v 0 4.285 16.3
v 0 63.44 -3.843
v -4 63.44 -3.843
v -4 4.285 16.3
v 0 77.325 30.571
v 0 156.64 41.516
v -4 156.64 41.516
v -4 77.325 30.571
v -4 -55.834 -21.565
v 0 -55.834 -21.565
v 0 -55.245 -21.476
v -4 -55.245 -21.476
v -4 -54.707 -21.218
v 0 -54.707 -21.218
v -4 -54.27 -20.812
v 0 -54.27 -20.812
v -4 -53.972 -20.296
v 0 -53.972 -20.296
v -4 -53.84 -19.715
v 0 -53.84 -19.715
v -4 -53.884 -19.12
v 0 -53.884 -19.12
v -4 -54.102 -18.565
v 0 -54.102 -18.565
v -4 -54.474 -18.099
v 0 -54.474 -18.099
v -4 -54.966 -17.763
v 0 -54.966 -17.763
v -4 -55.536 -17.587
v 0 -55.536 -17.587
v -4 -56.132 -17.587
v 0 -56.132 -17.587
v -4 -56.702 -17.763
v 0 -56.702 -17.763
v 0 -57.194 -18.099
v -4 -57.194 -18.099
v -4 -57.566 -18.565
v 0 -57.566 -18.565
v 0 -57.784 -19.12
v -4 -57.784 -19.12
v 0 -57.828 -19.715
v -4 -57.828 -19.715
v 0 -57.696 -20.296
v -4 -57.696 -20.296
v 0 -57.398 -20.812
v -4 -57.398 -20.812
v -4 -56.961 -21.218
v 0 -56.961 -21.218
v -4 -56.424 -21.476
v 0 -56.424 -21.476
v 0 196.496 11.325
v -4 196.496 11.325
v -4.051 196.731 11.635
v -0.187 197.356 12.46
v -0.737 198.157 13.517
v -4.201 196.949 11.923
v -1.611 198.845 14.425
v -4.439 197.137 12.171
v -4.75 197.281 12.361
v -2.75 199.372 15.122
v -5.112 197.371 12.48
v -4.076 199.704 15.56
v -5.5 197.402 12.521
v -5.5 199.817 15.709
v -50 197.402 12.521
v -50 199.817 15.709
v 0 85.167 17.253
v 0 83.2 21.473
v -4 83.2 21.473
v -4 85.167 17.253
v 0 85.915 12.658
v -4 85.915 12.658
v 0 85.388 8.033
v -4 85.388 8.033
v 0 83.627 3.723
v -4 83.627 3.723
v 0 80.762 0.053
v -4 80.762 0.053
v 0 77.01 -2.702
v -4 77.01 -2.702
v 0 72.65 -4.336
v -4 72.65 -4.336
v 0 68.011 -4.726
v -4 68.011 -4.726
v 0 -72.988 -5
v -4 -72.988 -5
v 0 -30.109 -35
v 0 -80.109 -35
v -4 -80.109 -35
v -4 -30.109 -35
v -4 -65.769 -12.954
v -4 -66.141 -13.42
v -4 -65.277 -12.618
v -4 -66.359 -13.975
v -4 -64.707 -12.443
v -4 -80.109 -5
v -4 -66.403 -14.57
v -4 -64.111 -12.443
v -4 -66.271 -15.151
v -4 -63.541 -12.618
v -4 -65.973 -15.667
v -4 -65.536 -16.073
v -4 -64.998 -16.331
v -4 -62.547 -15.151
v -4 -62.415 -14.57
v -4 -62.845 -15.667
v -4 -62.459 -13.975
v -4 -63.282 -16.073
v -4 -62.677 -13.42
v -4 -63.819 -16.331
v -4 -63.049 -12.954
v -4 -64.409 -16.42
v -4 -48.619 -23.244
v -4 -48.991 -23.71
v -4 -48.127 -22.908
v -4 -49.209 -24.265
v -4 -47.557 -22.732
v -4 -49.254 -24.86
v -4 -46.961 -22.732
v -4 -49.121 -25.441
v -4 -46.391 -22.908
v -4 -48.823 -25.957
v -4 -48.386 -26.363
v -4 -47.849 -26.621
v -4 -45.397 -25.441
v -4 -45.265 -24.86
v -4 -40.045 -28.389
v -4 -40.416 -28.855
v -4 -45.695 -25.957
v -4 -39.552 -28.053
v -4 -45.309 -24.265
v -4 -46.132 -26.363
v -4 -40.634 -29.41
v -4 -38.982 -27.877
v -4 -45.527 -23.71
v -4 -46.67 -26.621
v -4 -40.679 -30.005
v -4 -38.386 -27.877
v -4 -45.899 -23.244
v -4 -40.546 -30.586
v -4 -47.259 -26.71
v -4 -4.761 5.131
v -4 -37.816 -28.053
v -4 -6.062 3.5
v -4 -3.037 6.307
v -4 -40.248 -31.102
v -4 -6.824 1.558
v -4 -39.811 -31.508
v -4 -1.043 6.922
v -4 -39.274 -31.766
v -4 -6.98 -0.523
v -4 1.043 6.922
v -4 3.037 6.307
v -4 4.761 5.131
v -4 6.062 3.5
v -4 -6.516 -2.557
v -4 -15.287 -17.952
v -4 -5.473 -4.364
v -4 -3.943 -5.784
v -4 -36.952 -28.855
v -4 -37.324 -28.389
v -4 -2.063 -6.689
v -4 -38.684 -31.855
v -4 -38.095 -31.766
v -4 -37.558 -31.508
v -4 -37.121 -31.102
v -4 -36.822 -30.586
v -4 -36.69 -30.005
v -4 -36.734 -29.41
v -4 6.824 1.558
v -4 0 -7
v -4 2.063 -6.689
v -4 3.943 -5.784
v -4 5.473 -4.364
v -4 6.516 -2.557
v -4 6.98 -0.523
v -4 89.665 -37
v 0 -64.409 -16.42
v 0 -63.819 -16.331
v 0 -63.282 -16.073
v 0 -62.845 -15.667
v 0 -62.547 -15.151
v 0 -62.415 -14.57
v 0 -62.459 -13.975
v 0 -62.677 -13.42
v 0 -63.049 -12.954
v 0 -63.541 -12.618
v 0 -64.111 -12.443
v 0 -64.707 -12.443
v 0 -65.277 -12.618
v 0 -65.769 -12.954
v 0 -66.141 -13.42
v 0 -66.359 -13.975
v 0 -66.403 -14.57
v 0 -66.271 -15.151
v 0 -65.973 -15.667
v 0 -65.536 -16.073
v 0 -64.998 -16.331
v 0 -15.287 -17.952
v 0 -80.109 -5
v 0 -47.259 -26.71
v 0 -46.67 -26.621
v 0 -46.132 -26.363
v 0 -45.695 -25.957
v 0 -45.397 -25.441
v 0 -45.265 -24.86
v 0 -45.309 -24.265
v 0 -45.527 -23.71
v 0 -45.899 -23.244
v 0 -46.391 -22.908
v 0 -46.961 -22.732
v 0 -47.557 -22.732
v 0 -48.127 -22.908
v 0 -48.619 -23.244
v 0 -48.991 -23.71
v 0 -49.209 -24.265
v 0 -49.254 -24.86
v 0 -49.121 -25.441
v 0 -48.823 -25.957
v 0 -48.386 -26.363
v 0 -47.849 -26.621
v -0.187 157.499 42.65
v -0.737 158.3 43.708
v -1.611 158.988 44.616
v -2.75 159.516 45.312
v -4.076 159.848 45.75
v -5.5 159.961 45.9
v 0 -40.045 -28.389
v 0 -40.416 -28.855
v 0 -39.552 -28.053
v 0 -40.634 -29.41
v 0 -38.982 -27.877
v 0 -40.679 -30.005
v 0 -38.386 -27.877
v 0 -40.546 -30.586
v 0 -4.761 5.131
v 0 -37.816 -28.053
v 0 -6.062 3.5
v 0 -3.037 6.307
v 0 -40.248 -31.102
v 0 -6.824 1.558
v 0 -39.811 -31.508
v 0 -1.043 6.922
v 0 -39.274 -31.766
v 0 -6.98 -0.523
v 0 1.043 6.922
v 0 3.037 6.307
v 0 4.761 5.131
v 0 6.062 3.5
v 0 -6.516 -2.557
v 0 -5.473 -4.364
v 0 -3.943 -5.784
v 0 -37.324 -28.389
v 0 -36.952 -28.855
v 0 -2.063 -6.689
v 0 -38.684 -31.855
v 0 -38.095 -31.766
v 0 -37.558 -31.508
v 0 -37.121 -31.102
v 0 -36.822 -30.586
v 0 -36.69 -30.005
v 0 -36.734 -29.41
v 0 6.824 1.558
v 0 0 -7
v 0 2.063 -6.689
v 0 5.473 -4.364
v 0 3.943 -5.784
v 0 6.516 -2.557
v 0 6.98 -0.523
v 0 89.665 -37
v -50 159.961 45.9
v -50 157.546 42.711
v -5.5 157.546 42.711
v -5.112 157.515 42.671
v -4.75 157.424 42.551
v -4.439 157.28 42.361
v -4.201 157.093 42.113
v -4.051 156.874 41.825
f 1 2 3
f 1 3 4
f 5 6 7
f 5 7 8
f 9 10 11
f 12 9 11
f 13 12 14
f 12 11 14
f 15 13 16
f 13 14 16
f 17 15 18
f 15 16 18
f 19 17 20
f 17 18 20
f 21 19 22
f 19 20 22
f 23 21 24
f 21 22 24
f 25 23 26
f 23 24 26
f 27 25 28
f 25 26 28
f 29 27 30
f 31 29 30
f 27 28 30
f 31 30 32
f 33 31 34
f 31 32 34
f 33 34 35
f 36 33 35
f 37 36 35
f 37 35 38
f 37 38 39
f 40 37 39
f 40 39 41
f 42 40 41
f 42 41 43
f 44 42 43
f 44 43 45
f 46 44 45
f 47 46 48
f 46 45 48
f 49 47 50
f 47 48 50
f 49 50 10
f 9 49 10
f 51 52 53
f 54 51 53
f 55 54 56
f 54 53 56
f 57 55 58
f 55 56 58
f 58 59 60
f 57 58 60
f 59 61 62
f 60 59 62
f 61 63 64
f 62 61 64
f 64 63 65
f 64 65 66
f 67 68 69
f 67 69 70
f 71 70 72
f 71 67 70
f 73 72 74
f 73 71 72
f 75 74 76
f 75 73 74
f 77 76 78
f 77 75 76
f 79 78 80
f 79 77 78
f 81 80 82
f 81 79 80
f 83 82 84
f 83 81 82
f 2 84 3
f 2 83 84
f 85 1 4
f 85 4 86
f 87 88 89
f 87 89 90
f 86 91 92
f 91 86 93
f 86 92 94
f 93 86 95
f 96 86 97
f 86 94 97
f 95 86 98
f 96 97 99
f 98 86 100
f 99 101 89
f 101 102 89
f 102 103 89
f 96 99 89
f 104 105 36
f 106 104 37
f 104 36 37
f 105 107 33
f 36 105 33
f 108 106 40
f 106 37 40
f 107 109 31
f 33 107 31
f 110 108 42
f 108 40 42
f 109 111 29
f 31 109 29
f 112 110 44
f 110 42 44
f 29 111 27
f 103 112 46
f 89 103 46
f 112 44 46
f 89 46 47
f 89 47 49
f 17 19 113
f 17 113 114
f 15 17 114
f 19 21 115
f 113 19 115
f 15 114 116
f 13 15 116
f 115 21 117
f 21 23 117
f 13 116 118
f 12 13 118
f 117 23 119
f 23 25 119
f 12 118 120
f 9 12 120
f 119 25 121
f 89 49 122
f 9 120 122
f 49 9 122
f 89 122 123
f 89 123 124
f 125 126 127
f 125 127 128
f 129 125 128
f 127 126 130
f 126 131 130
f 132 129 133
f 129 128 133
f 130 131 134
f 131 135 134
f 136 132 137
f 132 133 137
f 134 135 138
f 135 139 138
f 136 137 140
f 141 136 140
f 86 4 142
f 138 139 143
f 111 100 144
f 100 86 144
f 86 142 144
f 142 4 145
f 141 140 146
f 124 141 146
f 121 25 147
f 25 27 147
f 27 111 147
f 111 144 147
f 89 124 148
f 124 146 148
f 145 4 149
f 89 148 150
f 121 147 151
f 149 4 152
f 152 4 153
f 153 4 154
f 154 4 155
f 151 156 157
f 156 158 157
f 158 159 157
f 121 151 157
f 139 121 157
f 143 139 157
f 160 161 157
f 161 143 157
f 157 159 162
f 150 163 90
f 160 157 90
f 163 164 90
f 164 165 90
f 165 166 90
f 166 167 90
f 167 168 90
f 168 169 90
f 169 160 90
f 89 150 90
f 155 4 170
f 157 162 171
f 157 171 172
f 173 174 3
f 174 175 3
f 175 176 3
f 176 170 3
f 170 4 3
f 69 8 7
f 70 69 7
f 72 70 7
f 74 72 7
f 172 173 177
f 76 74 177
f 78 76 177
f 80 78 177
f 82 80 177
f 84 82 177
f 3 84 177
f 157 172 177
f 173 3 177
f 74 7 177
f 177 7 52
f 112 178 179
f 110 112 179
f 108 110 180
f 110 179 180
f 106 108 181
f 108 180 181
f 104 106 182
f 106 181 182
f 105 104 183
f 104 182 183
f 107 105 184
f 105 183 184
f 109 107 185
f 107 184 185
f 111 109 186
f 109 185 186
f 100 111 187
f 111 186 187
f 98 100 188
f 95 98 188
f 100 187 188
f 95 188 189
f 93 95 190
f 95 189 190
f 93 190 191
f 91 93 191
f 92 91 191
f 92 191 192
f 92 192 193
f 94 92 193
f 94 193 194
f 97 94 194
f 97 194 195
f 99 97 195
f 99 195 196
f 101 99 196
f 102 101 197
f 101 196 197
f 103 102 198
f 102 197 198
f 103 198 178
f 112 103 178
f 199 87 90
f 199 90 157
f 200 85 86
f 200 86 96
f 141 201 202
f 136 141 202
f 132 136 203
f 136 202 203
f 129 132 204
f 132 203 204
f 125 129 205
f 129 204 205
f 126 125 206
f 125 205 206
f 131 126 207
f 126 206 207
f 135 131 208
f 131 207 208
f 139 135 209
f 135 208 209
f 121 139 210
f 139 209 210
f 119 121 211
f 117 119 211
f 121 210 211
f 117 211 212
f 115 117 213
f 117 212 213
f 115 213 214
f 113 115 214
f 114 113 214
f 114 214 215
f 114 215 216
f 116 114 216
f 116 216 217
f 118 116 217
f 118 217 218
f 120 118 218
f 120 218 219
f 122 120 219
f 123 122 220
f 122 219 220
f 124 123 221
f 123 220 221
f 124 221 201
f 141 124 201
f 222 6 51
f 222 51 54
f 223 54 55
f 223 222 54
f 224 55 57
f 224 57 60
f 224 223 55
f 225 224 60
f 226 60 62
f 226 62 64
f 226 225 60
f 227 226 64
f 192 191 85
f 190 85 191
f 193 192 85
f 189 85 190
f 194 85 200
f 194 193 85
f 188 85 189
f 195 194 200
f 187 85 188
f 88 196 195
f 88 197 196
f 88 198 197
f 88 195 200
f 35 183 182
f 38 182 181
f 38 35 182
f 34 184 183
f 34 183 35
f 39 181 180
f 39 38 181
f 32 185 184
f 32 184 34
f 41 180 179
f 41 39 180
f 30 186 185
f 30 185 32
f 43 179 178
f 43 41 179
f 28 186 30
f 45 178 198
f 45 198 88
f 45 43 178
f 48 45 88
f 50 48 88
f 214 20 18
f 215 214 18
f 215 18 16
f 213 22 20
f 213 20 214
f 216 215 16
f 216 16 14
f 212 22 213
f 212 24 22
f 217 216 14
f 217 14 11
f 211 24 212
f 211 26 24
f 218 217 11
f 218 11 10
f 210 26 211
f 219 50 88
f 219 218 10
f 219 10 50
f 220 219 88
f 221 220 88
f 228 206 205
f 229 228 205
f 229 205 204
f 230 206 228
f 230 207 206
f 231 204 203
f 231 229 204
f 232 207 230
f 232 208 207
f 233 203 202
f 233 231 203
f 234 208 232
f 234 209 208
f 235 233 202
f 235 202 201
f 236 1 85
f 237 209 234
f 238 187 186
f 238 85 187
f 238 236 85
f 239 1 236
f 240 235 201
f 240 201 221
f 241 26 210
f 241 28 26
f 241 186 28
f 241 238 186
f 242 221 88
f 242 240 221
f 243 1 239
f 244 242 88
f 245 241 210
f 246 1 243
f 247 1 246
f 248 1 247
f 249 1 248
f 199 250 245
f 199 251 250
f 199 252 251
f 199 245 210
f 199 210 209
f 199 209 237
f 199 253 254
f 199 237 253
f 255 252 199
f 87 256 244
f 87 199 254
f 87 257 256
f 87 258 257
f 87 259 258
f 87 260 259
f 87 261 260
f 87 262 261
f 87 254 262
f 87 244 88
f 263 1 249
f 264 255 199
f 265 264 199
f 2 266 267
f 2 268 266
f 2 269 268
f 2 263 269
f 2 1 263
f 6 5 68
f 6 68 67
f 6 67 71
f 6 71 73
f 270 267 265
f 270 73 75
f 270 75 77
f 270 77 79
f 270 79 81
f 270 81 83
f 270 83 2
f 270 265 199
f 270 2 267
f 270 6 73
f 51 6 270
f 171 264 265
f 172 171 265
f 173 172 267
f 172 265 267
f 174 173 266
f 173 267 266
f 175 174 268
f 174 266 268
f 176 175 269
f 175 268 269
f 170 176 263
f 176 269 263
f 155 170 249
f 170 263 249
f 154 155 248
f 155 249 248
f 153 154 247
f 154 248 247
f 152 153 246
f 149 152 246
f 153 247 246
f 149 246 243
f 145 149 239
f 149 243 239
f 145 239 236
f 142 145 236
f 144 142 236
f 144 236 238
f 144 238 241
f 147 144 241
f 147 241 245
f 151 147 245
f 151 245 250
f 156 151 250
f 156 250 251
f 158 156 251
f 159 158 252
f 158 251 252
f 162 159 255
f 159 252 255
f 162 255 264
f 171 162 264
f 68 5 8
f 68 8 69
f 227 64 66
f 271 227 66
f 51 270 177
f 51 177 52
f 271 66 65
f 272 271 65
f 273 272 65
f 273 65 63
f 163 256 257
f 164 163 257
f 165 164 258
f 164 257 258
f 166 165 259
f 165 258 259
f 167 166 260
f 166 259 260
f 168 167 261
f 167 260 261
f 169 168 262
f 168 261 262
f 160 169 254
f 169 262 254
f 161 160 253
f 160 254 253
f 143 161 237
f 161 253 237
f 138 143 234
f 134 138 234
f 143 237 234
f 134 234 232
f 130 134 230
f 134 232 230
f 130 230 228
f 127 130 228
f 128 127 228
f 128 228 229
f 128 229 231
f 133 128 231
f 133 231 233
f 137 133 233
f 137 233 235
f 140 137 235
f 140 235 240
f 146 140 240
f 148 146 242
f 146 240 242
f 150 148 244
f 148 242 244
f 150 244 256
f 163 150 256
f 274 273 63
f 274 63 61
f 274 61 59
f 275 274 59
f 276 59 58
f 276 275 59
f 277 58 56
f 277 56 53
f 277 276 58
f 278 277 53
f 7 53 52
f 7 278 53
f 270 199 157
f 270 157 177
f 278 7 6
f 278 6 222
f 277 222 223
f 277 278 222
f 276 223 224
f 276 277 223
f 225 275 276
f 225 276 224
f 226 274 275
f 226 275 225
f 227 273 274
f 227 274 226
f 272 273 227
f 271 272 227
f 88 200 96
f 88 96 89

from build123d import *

# Parameters (mm, degrees)
SKETCH_6_R             = 7
SKETCH_6_R_2           = 2
SM_BASE_FLANGE_2_DEPTH = 4
SM_EDGE_FLANGE_1_DEPTH = 50


# Sheet-metal steps are written as plain solids
with BuildPart() as part:
    # Эскиз6 → Базовая кромка2 (new body)
    with BuildSketch(Plane(origin=(0, 0, 0), x_dir=(0, 0, -1), z_dir=(1, 0, 0))):
        with BuildLine():
            Line((-41.515639953, 156.639911011), (-30.570860008, 77.324503301))
            Line((-30.570860008, 77.324503301), (-21.473166605, 83.200308456))
            ThreePointArc((-21.473166605, 83.200308456), (-1.78992877, 82.320794398), (3.842668301, 63.440189352))
            Line((3.842668301, 63.440189352), (-16.29997452, 4.284628471))
            Line((-16.29997452, 4.284628471), (5, -72.987711453))
            Line((5, -72.987711453), (5, -80.109264525))
            Line((5, -80.109264525), (35, -80.109264525))
            Line((35, -80.109264525), (35, -30.109264525))
            Line((35, -30.109264525), (17.952200663, -15.286686185))
            Line((17.952200663, -15.286686185), (37, 89.665096307))
            Line((37, 89.665096307), (-11.325084854, 196.496282933))
            Line((-11.325084854, 196.496282933), (-41.515639953, 156.639911011))
        make_face()
        Circle(SKETCH_6_R, mode=Mode.SUBTRACT)
        with Locations((29.855042446, -38.684193782)):
            Circle(SKETCH_6_R_2, mode=Mode.SUBTRACT)
        with Locations((24.710084891, -47.259123039)):
            Circle(SKETCH_6_R_2, mode=Mode.SUBTRACT)
        with Locations((19.565127337, -55.834052297)):
            Circle(SKETCH_6_R_2, mode=Mode.SUBTRACT)
        with Locations((14.420169783, -64.408981554)):
            Circle(SKETCH_6_R_2, mode=Mode.SUBTRACT)
    extrude(amount=-SM_BASE_FLANGE_2_DEPTH)

    # Ребро-кромка1 section (across the edge) → Ребро-кромка1 (add)
    with BuildSketch(Plane(origin=(-4, 157.545627664, 42.711331111), x_dir=(-3.4914813388431334e-15, -0.6038111019965894, -0.7971274384348241), z_dir=(0, 0.7971274384348241, -0.6038111019965894))):
        with BuildLine():
            Line((-4, 1.5), (-4, 46))
            Line((-4, 46), (0, 46))
            Line((0, 46), (0, 1.5))
            ThreePointArc((0, 1.5), (0.439339828, 0.439339828), (1.5, 0))
            Line((1.5, 0), (1.5, -4))
            ThreePointArc((1.5, -4), (-2.389087297, -2.389087297), (-4, 1.5))
        make_face()
    extrude(amount=SM_EDGE_FLANGE_1_DEPTH)


solid = part.part
